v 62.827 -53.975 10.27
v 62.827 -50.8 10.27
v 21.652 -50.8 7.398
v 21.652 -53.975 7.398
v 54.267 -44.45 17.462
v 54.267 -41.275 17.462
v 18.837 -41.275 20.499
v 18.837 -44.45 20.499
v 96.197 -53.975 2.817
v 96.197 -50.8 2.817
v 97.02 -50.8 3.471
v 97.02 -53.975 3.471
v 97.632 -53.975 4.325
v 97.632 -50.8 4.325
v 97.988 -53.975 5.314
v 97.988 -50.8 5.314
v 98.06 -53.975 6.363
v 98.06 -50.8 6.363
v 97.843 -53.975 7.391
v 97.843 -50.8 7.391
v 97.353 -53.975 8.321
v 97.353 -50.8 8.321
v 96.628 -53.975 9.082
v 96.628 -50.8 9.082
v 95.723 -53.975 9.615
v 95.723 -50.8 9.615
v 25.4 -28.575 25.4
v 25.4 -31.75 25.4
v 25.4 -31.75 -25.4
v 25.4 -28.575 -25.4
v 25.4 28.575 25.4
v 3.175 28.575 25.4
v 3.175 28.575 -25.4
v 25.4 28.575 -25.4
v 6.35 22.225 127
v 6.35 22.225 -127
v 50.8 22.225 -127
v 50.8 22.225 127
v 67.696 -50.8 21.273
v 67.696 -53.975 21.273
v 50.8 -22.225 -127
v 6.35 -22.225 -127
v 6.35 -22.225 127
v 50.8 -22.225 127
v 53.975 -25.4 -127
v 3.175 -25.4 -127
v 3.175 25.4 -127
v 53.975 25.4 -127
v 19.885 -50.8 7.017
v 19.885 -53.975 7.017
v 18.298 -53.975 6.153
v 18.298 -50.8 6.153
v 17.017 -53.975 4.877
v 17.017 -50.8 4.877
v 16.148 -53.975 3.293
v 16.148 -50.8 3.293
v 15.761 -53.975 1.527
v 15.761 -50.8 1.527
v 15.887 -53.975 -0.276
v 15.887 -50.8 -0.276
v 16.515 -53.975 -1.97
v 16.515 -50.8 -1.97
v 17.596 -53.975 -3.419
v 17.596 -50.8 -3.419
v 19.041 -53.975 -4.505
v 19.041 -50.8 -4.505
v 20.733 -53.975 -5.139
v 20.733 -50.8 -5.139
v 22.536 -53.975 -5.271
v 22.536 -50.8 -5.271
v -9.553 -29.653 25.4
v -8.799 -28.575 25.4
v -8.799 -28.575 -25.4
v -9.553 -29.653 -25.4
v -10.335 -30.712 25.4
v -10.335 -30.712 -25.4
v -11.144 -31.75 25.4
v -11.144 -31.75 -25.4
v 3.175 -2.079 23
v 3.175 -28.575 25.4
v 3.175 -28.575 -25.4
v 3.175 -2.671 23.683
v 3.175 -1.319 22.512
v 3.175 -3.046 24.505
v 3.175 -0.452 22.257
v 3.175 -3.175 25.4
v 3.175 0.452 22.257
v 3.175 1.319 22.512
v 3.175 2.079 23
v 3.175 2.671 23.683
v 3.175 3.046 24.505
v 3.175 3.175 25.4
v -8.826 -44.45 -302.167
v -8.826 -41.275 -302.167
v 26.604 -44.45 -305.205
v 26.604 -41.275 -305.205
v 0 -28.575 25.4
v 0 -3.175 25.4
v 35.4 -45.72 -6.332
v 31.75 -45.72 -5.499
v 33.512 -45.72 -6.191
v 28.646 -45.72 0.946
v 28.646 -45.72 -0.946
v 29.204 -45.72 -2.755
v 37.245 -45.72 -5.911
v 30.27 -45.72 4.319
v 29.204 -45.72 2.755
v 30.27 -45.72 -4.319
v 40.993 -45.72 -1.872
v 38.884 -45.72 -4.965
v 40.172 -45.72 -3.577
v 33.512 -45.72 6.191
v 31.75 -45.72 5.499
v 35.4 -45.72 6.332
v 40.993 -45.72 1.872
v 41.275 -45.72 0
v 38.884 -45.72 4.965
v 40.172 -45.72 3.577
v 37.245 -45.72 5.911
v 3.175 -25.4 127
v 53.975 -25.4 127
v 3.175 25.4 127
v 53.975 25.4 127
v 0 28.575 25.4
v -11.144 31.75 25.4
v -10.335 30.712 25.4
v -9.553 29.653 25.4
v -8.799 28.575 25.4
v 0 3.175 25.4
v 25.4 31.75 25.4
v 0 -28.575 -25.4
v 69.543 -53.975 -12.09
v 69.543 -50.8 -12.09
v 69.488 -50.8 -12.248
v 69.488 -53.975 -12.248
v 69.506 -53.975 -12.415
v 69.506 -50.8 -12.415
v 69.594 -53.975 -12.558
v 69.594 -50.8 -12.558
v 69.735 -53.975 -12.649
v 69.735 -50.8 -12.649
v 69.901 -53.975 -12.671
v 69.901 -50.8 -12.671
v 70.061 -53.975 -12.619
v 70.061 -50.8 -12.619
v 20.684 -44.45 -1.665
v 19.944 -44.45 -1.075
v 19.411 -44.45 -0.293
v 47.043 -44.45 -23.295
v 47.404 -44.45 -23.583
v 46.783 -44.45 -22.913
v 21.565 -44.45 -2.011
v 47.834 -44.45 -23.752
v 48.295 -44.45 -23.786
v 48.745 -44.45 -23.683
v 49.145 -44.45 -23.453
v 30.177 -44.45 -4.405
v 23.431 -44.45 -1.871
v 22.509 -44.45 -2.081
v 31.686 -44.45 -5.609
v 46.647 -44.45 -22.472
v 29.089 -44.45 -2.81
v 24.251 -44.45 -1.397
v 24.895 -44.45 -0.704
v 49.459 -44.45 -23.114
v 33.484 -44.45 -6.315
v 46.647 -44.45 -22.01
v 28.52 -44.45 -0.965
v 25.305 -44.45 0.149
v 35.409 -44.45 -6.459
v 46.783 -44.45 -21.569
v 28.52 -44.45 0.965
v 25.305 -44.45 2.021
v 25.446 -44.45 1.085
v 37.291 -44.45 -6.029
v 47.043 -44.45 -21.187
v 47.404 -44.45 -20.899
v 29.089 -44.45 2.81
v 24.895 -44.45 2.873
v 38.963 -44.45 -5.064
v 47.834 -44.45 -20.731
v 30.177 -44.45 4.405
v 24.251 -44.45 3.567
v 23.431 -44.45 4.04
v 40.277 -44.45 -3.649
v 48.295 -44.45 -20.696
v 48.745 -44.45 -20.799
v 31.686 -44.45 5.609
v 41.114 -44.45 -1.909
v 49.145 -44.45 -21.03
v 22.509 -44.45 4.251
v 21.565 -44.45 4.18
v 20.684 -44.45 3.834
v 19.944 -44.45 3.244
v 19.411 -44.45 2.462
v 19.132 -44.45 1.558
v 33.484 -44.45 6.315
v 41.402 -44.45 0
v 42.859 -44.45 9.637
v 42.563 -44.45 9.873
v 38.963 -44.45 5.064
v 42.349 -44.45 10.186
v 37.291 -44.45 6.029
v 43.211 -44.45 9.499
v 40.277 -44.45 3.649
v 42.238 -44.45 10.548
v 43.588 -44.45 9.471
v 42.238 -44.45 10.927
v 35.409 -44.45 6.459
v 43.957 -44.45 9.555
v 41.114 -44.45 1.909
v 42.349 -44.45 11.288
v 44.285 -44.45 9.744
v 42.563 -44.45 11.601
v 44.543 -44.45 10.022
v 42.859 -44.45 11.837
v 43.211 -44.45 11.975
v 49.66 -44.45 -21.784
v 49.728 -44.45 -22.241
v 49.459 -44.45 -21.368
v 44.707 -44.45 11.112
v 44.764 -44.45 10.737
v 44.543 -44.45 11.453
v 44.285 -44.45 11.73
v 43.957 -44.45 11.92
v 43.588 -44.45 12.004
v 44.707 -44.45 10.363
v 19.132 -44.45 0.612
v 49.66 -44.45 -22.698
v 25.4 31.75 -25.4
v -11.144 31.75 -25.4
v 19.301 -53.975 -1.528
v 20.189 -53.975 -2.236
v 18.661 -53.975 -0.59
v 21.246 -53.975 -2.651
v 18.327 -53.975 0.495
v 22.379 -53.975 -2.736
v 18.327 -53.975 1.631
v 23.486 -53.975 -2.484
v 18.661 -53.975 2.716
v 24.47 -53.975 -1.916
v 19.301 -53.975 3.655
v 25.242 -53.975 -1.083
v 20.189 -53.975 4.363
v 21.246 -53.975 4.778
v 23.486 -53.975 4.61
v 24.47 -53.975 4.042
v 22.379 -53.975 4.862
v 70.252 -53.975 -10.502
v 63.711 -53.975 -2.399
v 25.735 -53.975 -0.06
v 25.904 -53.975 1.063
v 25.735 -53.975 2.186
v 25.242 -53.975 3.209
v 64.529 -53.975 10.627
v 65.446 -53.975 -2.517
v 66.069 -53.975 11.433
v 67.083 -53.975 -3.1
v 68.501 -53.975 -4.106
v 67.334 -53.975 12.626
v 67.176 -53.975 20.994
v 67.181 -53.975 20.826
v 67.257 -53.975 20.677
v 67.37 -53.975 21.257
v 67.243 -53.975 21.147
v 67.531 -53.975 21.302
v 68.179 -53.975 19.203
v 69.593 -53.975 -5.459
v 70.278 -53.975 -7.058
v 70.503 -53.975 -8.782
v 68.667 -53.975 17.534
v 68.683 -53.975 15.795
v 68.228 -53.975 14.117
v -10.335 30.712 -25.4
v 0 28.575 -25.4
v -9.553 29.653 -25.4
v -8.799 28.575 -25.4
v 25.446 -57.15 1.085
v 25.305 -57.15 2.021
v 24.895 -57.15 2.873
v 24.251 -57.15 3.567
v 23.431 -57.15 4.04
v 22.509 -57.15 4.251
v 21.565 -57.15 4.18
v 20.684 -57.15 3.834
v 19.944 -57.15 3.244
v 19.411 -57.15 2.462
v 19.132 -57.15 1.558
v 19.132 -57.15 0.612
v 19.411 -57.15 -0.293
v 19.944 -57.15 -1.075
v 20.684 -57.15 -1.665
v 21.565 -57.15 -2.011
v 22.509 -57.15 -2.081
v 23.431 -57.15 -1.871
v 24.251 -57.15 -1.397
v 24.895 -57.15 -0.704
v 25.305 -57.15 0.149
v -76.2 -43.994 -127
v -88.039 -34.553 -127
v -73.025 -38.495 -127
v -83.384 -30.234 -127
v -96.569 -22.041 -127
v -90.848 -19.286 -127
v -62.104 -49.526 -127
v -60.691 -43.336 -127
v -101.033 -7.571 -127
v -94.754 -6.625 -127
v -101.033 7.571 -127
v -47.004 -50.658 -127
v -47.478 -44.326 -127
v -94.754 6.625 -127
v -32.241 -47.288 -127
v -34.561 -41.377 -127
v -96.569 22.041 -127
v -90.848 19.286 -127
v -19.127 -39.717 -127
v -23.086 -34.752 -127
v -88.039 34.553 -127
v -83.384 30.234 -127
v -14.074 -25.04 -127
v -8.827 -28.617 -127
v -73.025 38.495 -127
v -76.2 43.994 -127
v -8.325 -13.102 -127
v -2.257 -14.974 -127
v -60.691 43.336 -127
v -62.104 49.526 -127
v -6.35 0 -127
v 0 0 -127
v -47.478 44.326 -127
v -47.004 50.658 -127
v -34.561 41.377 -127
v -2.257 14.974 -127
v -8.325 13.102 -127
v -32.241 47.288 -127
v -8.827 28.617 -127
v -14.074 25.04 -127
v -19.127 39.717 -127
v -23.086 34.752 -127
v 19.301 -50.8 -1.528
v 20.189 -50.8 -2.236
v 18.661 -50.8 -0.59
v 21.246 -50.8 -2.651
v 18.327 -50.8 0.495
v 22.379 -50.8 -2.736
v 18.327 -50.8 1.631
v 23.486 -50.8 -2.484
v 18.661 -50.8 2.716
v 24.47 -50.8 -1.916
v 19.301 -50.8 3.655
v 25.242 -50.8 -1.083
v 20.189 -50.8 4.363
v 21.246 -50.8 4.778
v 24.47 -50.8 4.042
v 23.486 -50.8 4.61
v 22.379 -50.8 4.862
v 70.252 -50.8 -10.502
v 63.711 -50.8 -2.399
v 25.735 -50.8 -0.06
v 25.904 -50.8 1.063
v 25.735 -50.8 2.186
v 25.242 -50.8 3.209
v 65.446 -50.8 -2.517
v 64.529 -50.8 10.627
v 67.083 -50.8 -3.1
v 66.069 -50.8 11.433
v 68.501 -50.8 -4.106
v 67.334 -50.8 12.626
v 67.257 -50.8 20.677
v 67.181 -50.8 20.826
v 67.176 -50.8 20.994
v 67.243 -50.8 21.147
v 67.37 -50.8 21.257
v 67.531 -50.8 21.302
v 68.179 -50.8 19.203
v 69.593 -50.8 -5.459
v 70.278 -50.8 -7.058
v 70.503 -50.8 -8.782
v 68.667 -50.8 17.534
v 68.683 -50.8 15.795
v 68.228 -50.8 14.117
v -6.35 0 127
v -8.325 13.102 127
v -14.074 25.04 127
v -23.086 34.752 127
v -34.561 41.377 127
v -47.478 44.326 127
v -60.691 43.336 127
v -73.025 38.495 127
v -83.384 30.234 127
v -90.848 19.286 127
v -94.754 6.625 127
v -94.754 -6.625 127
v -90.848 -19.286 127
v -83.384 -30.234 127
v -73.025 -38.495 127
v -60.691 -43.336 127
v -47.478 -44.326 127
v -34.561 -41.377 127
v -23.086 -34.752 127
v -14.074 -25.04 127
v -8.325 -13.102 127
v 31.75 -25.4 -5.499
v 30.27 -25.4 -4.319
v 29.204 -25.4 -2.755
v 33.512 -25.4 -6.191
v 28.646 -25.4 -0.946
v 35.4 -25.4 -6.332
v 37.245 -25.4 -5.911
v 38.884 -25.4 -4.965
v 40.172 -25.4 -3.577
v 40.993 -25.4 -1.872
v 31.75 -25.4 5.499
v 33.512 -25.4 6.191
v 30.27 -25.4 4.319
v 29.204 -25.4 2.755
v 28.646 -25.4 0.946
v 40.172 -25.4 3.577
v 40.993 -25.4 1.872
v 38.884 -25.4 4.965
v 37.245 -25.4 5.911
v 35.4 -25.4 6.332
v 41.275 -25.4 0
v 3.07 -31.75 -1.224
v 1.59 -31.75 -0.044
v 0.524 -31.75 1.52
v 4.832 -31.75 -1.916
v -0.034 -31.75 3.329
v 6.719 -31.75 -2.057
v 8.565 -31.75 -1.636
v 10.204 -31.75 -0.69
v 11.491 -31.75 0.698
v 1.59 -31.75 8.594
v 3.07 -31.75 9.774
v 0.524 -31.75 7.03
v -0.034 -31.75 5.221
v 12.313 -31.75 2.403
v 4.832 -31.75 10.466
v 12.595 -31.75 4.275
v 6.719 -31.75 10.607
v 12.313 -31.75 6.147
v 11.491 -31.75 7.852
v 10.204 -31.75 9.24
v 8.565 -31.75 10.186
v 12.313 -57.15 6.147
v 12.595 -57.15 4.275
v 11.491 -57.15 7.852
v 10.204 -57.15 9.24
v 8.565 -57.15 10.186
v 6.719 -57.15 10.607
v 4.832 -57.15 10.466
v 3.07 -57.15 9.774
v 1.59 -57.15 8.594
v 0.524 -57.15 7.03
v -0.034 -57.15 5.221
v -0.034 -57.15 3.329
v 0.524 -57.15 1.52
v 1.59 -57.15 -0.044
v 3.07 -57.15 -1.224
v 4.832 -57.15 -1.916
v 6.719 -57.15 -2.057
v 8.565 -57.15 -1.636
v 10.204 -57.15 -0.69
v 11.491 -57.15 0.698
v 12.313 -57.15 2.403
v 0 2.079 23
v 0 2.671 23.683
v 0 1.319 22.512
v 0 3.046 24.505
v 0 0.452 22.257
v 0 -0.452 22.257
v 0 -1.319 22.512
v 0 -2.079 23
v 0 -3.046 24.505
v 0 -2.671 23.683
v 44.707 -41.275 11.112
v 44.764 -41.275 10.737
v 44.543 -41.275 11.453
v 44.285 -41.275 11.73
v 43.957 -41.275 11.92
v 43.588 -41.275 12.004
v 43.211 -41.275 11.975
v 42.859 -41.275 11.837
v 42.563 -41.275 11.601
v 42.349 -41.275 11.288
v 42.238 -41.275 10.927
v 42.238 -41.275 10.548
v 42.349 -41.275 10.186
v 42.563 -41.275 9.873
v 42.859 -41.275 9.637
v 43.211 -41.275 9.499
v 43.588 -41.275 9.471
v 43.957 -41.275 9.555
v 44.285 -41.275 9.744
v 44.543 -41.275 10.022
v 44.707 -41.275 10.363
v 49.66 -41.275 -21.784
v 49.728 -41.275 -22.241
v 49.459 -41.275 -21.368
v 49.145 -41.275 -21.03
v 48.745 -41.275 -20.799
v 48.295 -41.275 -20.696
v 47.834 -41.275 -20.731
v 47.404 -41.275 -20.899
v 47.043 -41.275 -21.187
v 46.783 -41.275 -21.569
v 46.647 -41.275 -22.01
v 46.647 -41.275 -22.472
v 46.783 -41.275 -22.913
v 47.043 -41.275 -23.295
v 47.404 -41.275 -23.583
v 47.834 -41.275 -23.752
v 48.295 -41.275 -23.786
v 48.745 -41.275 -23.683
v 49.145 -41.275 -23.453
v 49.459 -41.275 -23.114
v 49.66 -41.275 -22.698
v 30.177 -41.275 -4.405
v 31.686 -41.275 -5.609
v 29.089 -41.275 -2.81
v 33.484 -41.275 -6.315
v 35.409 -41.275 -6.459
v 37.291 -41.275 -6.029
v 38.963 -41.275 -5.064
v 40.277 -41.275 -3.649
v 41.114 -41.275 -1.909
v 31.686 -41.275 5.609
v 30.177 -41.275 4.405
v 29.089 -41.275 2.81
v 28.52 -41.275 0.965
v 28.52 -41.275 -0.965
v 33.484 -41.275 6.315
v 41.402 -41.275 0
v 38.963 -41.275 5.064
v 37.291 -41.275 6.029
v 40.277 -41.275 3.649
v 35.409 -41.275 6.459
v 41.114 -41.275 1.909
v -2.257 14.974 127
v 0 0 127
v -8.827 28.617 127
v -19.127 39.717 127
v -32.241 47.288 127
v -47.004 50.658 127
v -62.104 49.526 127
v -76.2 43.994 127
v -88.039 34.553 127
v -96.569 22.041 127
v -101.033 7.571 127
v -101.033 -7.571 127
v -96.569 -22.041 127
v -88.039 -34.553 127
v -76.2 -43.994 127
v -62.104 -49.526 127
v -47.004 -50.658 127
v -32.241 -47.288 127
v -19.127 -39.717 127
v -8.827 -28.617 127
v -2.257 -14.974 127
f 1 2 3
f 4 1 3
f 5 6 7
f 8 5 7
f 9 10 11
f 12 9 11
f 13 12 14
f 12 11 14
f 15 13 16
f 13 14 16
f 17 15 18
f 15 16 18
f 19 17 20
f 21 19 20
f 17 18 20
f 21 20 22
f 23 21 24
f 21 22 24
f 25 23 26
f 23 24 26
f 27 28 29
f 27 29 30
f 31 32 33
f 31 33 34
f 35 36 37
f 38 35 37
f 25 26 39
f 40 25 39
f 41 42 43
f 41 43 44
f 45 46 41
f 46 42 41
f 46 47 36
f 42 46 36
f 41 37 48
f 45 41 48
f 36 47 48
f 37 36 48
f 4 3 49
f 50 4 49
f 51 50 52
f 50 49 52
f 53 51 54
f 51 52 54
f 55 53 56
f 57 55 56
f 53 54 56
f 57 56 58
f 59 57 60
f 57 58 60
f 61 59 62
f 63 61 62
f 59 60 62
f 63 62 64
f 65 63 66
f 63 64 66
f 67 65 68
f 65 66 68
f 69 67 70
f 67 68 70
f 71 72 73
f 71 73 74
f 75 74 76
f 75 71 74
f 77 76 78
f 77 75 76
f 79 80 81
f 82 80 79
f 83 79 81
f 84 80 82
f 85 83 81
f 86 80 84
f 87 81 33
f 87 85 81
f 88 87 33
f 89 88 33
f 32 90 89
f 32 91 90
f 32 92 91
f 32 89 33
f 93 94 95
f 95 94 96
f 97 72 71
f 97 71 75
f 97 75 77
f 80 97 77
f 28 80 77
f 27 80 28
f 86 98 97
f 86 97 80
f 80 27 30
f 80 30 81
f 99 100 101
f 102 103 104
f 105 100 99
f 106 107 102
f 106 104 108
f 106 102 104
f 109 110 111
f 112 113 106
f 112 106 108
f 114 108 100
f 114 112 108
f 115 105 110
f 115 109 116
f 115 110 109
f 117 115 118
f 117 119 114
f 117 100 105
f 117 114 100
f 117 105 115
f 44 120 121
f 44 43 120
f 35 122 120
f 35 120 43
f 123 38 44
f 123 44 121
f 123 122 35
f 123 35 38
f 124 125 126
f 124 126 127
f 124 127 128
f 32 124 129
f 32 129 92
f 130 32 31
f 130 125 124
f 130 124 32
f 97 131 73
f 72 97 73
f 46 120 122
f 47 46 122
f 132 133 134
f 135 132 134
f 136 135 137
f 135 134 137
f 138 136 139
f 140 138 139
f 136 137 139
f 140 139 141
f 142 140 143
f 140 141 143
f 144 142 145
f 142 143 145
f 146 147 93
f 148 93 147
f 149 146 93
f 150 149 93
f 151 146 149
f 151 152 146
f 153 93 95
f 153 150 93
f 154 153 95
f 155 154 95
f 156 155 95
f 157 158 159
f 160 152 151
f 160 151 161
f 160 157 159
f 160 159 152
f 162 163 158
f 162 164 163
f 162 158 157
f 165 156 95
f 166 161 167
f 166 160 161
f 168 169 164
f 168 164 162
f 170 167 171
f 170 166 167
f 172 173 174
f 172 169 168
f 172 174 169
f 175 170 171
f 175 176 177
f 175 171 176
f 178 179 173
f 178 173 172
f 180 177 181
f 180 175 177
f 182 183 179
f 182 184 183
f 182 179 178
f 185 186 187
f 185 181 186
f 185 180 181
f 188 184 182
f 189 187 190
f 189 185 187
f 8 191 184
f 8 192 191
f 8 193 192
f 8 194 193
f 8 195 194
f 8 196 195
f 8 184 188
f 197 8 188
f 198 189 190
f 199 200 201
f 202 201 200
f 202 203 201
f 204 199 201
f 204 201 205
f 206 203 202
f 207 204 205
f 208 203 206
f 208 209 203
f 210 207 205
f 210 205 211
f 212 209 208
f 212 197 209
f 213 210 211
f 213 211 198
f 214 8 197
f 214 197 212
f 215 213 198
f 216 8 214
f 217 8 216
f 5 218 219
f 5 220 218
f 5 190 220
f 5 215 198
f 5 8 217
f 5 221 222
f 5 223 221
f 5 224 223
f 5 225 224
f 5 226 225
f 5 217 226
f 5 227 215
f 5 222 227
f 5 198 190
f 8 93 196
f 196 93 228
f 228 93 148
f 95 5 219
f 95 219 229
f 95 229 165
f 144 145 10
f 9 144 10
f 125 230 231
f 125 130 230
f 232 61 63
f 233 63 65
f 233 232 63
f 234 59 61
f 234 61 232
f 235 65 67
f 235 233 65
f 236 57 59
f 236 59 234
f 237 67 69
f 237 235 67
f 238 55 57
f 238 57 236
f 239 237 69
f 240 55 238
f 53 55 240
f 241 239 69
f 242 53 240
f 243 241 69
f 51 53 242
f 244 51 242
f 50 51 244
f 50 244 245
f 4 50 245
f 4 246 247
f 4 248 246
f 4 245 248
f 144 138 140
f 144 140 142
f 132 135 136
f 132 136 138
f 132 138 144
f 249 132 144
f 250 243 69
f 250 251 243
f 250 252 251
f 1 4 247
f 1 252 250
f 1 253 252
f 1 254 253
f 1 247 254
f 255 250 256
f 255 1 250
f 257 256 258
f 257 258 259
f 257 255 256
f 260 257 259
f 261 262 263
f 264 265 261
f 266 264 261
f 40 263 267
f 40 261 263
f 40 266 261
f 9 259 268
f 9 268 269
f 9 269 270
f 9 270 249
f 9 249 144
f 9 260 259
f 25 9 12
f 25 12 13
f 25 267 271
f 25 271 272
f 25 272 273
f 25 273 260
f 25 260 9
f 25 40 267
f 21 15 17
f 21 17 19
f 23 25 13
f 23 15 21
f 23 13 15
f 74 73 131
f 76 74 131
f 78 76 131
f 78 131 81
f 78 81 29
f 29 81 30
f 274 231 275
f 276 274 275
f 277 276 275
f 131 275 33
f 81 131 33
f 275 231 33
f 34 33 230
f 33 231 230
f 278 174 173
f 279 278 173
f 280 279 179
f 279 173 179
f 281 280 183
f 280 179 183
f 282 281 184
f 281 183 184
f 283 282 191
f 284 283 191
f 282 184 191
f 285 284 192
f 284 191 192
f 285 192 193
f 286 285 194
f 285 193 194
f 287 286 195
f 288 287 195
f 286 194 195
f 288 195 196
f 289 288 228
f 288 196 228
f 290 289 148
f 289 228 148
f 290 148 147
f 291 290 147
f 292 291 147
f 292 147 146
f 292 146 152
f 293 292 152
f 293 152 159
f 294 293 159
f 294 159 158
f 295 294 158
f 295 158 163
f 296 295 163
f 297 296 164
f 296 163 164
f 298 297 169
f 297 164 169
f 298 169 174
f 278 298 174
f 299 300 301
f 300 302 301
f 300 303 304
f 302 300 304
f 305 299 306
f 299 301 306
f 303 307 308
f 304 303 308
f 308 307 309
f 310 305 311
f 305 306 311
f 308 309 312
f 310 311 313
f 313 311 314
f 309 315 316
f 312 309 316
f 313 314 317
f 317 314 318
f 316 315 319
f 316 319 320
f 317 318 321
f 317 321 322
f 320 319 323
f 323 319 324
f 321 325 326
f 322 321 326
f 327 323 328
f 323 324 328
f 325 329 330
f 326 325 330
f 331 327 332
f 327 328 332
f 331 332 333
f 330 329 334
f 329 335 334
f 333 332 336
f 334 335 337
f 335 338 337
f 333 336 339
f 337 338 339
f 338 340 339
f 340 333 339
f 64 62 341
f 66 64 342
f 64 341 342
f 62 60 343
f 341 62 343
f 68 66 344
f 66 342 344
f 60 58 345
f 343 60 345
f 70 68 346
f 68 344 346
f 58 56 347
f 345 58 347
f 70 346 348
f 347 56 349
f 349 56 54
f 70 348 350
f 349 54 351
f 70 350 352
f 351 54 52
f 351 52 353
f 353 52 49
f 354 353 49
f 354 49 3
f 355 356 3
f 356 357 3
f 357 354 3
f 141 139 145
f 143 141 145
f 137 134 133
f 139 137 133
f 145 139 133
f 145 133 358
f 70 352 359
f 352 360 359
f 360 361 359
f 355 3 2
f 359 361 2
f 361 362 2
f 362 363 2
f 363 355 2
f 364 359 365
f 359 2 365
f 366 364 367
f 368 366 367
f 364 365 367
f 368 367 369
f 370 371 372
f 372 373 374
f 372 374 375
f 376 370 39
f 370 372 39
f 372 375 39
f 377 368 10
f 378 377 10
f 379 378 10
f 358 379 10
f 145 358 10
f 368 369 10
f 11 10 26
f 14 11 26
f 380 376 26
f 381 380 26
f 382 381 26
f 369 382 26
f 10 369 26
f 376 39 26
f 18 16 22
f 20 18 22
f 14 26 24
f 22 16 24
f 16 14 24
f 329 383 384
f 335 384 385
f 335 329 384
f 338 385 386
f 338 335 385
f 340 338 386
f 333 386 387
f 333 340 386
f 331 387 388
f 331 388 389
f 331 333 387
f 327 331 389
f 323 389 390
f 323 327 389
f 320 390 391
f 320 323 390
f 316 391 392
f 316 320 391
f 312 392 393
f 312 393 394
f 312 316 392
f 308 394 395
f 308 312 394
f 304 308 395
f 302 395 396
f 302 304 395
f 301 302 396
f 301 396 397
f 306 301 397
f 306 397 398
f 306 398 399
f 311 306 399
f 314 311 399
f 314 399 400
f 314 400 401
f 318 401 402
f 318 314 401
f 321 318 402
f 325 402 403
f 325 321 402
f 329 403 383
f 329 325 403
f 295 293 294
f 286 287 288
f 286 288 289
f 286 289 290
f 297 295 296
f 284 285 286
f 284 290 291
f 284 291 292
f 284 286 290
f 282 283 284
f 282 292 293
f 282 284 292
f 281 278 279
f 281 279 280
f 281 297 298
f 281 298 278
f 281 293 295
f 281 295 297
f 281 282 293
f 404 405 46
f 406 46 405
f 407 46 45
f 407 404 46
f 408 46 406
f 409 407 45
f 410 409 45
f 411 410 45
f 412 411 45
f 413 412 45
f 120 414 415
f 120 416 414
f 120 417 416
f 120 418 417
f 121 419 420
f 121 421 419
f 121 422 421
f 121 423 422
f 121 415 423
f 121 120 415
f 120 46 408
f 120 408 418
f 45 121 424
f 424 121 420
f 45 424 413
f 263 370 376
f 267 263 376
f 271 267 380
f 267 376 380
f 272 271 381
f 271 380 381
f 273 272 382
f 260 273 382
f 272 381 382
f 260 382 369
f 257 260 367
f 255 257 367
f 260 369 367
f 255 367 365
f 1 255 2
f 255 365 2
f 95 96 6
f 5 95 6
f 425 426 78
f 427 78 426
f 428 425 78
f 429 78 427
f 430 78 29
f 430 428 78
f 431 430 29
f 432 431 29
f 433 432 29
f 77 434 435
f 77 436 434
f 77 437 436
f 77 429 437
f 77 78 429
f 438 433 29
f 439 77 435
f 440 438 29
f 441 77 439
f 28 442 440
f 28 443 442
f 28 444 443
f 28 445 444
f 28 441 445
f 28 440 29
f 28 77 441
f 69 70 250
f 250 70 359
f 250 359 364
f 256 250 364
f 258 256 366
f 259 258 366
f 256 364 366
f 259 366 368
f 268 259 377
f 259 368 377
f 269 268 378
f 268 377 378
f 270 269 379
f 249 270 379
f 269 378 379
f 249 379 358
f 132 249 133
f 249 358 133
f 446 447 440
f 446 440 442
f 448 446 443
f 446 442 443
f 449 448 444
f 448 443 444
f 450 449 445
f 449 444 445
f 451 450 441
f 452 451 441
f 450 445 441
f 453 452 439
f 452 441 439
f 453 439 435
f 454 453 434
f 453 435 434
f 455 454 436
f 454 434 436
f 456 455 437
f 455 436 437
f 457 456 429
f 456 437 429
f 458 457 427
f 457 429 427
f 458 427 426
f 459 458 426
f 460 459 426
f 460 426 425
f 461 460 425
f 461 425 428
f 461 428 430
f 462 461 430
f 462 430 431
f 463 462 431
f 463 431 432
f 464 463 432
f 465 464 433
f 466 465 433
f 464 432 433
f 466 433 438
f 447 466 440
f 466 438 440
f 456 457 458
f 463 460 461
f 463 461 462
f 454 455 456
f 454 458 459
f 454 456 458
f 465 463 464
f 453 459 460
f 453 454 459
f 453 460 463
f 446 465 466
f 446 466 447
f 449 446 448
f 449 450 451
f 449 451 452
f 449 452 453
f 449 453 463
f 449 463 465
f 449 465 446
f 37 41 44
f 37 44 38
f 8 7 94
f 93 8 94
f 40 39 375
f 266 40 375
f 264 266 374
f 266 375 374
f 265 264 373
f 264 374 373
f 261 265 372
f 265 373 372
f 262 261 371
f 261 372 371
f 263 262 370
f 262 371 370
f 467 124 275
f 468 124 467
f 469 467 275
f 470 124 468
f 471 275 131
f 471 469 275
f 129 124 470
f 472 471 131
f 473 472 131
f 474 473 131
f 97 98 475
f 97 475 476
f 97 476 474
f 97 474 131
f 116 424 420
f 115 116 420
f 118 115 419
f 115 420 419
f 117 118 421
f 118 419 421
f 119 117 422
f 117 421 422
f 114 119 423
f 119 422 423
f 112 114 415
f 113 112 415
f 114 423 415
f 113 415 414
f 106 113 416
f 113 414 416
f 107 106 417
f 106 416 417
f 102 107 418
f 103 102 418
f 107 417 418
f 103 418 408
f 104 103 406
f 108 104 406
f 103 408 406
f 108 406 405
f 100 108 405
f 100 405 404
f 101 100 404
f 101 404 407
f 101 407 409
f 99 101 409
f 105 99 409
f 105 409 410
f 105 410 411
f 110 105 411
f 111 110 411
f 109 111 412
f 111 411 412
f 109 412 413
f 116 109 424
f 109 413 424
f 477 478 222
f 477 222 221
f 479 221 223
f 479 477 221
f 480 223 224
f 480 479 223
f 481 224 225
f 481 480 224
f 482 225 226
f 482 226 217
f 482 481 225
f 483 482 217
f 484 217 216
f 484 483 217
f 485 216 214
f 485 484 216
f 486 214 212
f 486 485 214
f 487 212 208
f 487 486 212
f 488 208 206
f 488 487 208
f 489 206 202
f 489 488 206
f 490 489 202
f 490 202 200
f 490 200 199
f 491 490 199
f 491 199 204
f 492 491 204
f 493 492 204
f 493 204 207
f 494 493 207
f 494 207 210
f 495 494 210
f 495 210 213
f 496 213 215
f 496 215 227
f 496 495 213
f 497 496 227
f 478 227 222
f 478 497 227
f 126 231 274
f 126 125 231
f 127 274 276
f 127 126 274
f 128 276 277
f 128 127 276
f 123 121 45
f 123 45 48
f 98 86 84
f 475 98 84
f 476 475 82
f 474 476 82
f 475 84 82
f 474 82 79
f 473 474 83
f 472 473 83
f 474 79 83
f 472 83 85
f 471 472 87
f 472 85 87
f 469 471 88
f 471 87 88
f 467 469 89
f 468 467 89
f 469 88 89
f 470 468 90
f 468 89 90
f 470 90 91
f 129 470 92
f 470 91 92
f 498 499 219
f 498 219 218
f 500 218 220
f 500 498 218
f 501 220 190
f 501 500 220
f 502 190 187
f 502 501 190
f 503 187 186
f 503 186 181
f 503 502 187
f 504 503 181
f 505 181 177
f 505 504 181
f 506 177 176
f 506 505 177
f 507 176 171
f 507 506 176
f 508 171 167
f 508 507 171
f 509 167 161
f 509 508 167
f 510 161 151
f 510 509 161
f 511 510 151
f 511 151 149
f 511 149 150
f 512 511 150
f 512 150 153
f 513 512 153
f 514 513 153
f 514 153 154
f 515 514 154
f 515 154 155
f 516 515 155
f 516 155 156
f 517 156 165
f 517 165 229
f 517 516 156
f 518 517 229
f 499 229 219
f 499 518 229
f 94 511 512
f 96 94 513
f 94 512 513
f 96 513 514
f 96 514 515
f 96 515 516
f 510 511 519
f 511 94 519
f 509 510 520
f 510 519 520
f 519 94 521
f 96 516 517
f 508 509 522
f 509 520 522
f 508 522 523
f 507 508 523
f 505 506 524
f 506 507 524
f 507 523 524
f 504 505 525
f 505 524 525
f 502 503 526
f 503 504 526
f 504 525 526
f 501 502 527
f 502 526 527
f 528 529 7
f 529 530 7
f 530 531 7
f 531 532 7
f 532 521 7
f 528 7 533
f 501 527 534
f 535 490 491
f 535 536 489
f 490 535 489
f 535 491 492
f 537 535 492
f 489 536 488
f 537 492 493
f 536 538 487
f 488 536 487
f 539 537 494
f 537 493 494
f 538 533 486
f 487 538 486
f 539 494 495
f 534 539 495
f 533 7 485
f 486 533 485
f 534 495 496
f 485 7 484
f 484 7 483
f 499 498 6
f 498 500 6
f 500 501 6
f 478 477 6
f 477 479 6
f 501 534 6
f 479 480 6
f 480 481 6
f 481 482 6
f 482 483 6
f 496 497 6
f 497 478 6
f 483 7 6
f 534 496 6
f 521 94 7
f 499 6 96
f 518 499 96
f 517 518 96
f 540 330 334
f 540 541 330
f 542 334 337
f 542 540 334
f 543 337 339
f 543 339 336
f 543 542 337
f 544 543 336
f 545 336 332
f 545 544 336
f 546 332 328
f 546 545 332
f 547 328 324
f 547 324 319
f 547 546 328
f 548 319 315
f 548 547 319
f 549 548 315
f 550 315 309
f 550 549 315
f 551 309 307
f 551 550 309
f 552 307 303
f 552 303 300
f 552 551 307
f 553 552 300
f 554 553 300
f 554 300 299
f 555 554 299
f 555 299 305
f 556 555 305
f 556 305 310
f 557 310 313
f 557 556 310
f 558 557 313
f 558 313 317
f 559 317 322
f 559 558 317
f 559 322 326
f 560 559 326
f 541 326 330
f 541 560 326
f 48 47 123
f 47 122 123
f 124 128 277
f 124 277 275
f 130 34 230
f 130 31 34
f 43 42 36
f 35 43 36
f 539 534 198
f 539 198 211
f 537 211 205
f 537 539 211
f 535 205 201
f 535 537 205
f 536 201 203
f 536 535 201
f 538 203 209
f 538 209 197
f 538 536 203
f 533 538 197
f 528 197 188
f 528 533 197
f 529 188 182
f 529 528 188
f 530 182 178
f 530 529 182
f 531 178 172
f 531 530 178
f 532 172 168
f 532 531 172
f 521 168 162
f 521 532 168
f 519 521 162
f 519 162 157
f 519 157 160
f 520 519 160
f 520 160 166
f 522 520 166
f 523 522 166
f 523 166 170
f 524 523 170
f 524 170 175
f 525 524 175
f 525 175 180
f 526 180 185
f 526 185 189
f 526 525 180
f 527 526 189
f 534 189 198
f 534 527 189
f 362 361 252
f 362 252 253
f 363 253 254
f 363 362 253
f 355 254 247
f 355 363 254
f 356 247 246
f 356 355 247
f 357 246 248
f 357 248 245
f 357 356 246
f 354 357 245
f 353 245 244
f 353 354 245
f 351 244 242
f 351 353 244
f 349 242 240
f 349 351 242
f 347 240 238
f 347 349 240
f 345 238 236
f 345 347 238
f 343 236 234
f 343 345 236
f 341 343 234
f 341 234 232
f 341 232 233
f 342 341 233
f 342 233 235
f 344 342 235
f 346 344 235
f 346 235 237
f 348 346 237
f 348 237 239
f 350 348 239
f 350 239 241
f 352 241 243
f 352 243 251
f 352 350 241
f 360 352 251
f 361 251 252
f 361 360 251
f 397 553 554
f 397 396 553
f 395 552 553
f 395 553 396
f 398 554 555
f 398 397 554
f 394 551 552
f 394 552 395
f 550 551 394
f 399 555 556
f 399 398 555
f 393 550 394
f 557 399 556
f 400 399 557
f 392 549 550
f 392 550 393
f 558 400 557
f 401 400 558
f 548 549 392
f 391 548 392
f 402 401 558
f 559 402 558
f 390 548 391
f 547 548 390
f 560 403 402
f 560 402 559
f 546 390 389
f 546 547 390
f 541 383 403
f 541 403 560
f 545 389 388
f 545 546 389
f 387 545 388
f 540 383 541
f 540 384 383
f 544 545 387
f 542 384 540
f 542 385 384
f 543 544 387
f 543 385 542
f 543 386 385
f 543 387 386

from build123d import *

# Parameters (mm, degrees)
F1_DEPTH  = 25.4
F2_R      = 3.175
F3_DEPTH  = 14.3202627102
F4_R      = 50.8
F4_R_2    = 44.45
F5_DEPTH  = 127
F4_W      = 50.8
F4_H      = 50.8
F4_W_2    = 44.45
F4_H_2    = 44.45
F6_R      = 6.35
F7_DEPTH  = 25.4
F8_R      = 6.35
F9_DEPTH  = 20.32
F11_START = 50.8
F10_R     = 3.81
F11_DEPTH = 3.175
F12_START = 15.875
F8_R_2    = 3.175
F8_R_3    = 6.477
F8_R_4    = 1.5494
F8_R_5    = 1.27
F12_DEPTH = 3.175
F13_START = 19.05
F13_DEPTH = 12.7


# Not quite as in the source:
# - a feature names something its author has since deleted; it is built from what else it names


with BuildPart() as f1:
    # F0 (on Top) → F1 (new body, symmetric)
    with BuildSketch(Plane.XY):
        with BuildLine():
            Line((0, 28.575), (0, 31.75))
            Line((0, 31.75), (-11.1442627102, 31.75))
            ThreePointArc((-11.1442627102, 31.75), (-9.940629285, 30.1852915304), (-8.7986979368, 28.575))
            Line((-8.7986979368, 28.575), (0, 28.575))
        make_face()
        Polygon((25.4, 28.575), (25.4, 31.75), (0, 31.75), (0, 28.575), (0, -28.575), (0, -31.75), (25.4, -31.75), (25.4, -28.575), (3.175, -28.575), (3.175, 28.575), align=None)
        with BuildLine():
            Line((0, -31.75), (0, -28.575))
            Line((0, -28.575), (-8.7986979368, -28.575))
            ThreePointArc((-8.7986979368, -28.575), (-9.940629285, -30.1852915304), (-11.1442627102, -31.75))
            Line((-11.1442627102, -31.75), (0, -31.75))
        make_face()
    extrude(amount=F1_DEPTH, both=True)

    # F2 (on face) → F3 (cut, through all)
    with BuildSketch(Plane.YZ.offset(3.175)):
        with Locations((0, 25.4)):
            Circle(F2_R)
    extrude(amount=-F3_DEPTH, mode=Mode.SUBTRACT)

    # F6 (on face) → F7 (join)
    with BuildSketch(Plane.XZ.offset(31.75)):
        with Locations((6.2447981909, 4.2749713175)):
            Circle(F6_R)
    extrude(amount=F7_DEPTH)


with BuildPart() as f5:
    # F4 (on Top) → F5 (new body, symmetric)
    with BuildSketch(Plane.XY):
        with Locations((-50.8, 0)):
            Circle(F4_R)
        with Locations((-50.8, 0)):
            Circle(F4_R_2, mode=Mode.SUBTRACT)
    extrude(amount=F5_DEPTH, both=True)


with BuildPart() as f5b:
    # F4 (on Top) → F5, piece 2 (new body, symmetric)
    with BuildSketch(Plane.XY):
        with Locations((28.575, 0)):
            Rectangle(F4_W, F4_H)
        with Locations((28.575, 0)):
            Rectangle(F4_W_2, F4_H_2, mode=Mode.SUBTRACT)
    extrude(amount=F5_DEPTH, both=True)

    # F8 (on face) → F9 (join)
    with BuildSketch(Plane.XZ.offset(25.4)):
        with Locations((34.925, 0)):
            Circle(F8_R)
    extrude(amount=F9_DEPTH)


with BuildPart() as f11:
    # F10 (on Front) → F11 (new body)
    with BuildSketch(Plane.XZ.offset(F11_START)):
        with BuildLine():
            Line((62.8270369727, 10.2701259875), (21.6521058039, 7.3977283401))
            ThreePointArc((21.6521058039, 7.3977283401), (15.759408339, 0.6212162145), (22.5359204646, -5.2714812503))
            Line((22.5359204646, -5.2714812503), (63.7108516334, -2.3990836029))
            ThreePointArc((63.7108516334, -2.3990836029), (69.5933796071, -5.4592194313), (69.5433316896, -12.0899103346))
            ThreePointArc((69.5433316896, -12.0899103346), (69.5942249576, -12.5575210472), (70.0605169279, -12.6193409606))
            Line((70.0605169279, -12.6193409606), (96.1969817693, 2.8168733057))
            ThreePointArc((96.1969817693, 2.8168733057), (98.0602358988, 6.3625908021), (95.7227206874, 9.6152591148))
            Line((95.7227206874, 9.6152591148), (67.6961578025, 21.2730152514))
            ThreePointArc((67.6961578025, 21.2730152514), (67.2429657872, 21.1470513659), (67.2574913344, 20.6769036107))
            ThreePointArc((67.2574913344, 20.6769036107), (68.2276991914, 14.1173866037), (62.8270369727, 10.2701259875))
        make_face()
        with Locations((22.0940131342, 1.0631235449)):
            Circle(F10_R, mode=Mode.SUBTRACT)
    extrude(amount=F11_DEPTH)


with BuildPart() as f12:
    # F8 (on face) → F12 (new body)
    with BuildSketch(Plane.XZ.offset(25.4).offset(F12_START)):
        Polygon((18.8372476626, 20.499149366), (-8.8261978146, -302.1671740772), (26.6038298576, -305.2047288747), (54.2672753347, 17.4615945685), align=None)
        with Locations((22.2714186885, 1.0848409991)):
            Circle(F8_R_2, mode=Mode.SUBTRACT)
        with Locations((34.925, 0)):
            Circle(F8_R_3, mode=Mode.SUBTRACT)
        with Locations((48.1789697316, -22.2411817218)):
            Circle(F8_R_4, mode=Mode.SUBTRACT)
        with Locations((43.4935056861, 10.7373185809)):
            Circle(F8_R_5, mode=Mode.SUBTRACT)
        with Locations((22.2714186885, 1.0848409991)):
            Circle(F8_R_2)
    extrude(amount=F12_DEPTH)

    # F8 (on face) → F13 (join)
    with BuildSketch(Plane.XZ.offset(25.4).offset(F13_START)):
        with Locations((22.2714186885, 1.0848409991)):
            Circle(F8_R_2)
    extrude(amount=F13_DEPTH)


solid = Compound([f1.part, f5.part, f5b.part, f11.part, f12.part])
